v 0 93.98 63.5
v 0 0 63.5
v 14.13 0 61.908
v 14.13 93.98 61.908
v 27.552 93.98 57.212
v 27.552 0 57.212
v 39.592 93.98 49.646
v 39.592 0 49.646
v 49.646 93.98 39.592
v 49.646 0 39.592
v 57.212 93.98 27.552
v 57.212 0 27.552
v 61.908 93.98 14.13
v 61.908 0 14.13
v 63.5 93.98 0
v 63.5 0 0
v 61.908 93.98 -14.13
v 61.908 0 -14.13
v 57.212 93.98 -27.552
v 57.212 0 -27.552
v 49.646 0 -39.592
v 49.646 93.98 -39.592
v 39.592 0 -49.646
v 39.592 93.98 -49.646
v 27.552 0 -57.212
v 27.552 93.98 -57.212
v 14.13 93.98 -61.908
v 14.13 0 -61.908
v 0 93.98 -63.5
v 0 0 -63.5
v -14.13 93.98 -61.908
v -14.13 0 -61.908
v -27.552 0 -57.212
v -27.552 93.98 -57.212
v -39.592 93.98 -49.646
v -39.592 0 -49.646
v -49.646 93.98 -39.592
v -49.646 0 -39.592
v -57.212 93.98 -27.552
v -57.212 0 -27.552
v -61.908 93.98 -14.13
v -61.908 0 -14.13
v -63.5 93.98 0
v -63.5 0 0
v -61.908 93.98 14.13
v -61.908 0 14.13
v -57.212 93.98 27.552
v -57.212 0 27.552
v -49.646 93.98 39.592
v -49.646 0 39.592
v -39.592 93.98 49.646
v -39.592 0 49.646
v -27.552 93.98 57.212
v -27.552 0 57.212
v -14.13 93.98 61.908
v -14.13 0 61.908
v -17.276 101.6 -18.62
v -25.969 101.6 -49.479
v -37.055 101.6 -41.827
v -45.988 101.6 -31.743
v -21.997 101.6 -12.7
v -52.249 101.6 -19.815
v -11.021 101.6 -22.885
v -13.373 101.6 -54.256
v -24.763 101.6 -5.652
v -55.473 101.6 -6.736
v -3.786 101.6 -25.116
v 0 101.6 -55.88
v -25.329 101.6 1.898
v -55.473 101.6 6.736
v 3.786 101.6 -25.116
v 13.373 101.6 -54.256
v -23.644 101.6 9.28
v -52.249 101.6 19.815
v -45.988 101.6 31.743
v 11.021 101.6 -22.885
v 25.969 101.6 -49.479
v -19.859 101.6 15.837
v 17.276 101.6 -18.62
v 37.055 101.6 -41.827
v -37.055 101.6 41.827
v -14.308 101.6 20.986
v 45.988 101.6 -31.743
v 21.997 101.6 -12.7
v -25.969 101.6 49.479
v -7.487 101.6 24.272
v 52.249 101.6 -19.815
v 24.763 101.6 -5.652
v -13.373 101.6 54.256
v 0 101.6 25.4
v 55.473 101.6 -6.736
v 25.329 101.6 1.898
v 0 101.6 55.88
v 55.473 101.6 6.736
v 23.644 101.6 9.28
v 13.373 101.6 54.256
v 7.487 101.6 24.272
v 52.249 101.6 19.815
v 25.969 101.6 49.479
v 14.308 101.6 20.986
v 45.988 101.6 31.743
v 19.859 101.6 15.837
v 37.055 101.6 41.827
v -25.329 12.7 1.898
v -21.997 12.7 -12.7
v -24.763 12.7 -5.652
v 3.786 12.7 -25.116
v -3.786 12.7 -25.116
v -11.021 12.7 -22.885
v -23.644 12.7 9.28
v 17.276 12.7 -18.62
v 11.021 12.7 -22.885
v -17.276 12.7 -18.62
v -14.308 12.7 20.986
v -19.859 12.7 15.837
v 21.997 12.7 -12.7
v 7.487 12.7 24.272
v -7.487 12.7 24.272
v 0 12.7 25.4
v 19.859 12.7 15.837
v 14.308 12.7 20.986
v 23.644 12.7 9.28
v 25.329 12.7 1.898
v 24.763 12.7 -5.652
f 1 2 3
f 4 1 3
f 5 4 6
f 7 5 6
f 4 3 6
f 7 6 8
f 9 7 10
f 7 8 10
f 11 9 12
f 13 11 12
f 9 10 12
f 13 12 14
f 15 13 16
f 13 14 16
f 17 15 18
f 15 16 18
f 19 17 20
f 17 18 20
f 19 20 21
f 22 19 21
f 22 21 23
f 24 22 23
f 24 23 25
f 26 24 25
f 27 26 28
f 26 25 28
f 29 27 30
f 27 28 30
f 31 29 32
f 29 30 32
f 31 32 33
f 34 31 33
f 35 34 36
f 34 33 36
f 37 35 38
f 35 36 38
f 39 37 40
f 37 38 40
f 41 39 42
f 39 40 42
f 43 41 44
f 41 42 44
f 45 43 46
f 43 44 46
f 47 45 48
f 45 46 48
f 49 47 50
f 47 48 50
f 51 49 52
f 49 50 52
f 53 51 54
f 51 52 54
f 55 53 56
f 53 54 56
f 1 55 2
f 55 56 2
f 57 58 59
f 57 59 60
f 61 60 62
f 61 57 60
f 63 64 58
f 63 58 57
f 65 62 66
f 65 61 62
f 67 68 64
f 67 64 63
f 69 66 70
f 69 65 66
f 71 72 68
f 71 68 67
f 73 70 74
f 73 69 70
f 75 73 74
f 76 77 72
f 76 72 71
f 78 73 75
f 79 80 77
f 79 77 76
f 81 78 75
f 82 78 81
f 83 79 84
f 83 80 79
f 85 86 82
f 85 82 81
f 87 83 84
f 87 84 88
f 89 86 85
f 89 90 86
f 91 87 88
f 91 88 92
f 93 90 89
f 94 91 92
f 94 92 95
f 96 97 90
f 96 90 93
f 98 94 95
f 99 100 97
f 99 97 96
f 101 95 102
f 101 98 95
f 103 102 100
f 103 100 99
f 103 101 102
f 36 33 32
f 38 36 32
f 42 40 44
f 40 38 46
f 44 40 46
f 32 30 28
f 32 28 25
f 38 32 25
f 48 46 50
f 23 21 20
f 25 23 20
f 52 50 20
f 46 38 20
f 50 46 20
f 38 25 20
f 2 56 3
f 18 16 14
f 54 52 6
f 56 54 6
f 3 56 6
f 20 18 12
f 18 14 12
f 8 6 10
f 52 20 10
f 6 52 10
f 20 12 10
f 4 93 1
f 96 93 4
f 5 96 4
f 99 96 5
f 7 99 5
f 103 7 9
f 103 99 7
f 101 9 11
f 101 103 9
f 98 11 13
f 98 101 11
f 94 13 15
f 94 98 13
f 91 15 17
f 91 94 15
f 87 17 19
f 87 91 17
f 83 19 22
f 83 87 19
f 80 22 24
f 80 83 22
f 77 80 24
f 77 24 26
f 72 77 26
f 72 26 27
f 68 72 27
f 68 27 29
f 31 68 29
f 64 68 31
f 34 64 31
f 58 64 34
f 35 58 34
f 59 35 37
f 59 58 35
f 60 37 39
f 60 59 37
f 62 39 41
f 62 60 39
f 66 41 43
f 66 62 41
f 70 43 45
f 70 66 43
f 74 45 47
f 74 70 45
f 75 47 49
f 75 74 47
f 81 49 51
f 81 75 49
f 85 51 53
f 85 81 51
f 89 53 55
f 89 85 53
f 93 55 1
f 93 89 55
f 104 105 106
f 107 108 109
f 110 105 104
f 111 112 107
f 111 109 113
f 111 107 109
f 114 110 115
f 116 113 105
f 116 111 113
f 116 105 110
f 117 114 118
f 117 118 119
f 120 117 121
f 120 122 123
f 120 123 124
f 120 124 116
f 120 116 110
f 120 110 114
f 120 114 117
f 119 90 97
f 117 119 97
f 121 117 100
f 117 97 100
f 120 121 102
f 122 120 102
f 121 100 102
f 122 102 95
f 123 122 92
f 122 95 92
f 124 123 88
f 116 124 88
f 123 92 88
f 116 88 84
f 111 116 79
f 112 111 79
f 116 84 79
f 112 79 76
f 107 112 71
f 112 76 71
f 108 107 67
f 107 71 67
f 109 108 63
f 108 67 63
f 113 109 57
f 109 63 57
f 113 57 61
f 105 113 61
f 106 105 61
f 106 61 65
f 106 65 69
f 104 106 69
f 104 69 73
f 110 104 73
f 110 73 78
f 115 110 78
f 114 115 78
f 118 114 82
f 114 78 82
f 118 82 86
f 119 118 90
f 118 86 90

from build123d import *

# Parameters (mm, degrees)
SKETCH1_R           = 63.5
BOSS_EXTRUDE1_DEPTH = 101.6
SKETCH2_R           = 25.4
CUT_EXTRUDE1_DEPTH  = 88.9
FILLET1_SIZE        = 7.62


with BuildPart() as part:
    # Sketch1 → Boss-Extrude1 (new body)
    with BuildSketch(Plane(origin=(0, 0, 0), x_dir=(1, 0, 0), z_dir=(0, 1, 0))):
        Circle(SKETCH1_R)
    extrude(amount=BOSS_EXTRUDE1_DEPTH)

    # Sketch2 → Cut-Extrude1 (cut)
    with BuildSketch(Plane(origin=(0, 101.6, 0), x_dir=(1, 0, 0), z_dir=(0, 1, 0))):
        Circle(SKETCH2_R)
    extrude(amount=-CUT_EXTRUDE1_DEPTH, mode=Mode.SUBTRACT)

    # Fillet1
    fillet1_edges = [part.edges().sort_by_distance(p)[0] for p in [
        (-63.5, 101.6, 0),
    ]]
    chamfer(fillet1_edges, length=FILLET1_SIZE)


solid = part.part
